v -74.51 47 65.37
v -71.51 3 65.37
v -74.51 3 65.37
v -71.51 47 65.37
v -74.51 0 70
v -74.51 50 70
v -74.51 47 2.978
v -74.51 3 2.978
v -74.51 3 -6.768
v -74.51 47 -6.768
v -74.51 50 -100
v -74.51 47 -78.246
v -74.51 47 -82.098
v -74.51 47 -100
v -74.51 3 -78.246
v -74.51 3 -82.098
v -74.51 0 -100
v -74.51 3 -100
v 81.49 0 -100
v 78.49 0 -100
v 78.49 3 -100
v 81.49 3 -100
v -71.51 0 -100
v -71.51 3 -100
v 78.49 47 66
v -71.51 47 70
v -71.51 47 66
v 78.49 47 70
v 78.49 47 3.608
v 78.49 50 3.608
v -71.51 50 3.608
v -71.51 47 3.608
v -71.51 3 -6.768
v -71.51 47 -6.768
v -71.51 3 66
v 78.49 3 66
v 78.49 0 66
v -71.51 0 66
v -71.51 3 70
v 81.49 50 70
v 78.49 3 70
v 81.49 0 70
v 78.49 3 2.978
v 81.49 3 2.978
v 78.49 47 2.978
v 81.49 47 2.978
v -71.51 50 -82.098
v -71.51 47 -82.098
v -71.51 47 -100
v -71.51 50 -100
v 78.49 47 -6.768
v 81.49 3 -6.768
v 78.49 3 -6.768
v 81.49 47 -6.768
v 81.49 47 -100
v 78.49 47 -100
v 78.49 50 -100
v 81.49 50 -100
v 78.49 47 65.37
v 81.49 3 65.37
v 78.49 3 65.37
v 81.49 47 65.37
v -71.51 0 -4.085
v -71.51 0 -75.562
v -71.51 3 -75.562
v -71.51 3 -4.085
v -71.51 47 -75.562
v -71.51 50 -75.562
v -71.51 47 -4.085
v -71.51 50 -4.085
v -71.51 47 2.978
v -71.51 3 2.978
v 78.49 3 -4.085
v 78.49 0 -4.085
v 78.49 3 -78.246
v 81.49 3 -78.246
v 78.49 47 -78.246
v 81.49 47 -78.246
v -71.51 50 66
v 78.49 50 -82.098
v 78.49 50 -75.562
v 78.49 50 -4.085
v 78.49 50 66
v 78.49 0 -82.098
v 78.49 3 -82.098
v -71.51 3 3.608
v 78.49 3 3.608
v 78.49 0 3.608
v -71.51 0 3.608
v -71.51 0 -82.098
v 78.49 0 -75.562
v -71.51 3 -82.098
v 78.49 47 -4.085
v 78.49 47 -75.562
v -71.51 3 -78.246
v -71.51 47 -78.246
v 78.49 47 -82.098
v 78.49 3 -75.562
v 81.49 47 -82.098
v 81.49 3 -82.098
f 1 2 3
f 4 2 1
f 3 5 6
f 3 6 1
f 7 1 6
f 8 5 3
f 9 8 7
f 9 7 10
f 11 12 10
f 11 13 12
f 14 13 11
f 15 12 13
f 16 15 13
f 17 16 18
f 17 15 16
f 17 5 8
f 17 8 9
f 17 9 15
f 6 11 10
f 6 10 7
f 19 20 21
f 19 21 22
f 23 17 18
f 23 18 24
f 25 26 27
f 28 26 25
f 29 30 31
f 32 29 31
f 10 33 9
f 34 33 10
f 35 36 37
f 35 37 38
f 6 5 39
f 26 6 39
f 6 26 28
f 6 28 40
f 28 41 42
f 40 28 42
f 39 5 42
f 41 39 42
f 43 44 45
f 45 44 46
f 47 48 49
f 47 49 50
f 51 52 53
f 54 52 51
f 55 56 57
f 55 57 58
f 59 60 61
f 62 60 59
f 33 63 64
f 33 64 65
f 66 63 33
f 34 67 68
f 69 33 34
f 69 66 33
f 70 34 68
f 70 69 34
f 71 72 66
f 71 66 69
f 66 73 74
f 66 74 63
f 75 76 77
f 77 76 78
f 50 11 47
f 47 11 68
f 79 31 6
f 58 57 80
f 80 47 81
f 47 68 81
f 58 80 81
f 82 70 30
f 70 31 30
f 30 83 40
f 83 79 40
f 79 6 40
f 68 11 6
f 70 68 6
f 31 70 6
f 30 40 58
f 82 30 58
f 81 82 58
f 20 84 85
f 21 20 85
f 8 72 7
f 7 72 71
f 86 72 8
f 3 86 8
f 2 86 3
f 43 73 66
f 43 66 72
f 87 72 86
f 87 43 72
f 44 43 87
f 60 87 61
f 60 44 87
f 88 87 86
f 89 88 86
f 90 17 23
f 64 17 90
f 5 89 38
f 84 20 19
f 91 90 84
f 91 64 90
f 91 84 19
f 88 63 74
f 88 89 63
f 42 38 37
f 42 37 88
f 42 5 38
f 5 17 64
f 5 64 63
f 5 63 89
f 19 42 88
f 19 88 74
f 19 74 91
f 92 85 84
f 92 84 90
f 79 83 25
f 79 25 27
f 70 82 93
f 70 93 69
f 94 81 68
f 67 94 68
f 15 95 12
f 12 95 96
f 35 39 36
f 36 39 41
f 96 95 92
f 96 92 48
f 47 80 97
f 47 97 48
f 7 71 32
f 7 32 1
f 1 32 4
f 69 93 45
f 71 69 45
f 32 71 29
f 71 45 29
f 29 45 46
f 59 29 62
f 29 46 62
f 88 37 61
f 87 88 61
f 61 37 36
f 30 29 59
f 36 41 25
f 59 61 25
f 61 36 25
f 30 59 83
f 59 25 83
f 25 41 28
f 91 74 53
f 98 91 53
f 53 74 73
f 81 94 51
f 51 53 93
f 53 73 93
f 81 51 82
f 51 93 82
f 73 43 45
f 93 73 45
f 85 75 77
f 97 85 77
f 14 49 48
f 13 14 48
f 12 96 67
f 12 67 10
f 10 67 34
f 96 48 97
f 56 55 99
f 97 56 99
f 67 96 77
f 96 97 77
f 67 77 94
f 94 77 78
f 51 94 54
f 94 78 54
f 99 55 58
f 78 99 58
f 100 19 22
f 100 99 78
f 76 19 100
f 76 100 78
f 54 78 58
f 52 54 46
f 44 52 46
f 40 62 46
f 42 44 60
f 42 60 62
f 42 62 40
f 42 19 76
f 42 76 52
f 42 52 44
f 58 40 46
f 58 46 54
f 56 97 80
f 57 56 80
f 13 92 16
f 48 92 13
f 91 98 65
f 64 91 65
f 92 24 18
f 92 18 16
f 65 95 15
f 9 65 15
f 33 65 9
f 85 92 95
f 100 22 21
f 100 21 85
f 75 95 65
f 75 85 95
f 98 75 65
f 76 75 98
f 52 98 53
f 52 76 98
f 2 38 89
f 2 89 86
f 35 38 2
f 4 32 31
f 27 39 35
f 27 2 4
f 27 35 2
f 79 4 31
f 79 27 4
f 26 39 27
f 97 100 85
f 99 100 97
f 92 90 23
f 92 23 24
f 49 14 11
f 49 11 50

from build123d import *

# Parameters (mm, degrees)
F0_W     = 156
F0_H     = 70
F0_H_2   = 80
F0_H_3   = 20
F1_DEPTH = 50
F2_W     = 150
F2_H     = 17.901978
F2_H_2   = 71.477221
F2_H_3   = 62.391793
F3_DEPTH = 70
F4_W     = 150
F4_H     = 44
F5_DEPTH = 200
F6_W     = 44
F6_H     = 17.90198
F6_H_2   = 71.47722
F6_H_3   = 62.39179
F7_DEPTH = 200


with BuildPart() as f1:
    # F0 (on Front) → F1 (new body)
    with BuildSketch(Plane.XZ):
        with Locations((3.490141, 35)):
            Rectangle(F0_W, F0_H)
        with Locations((3.490141, -40)):
            Rectangle(F0_W, F0_H_2)
        with Locations((3.490141, -90)):
            Rectangle(F0_W, F0_H_3)
    extrude(amount=-F1_DEPTH)

    # F2 (on face) → F3 (cut)
    with BuildSketch(Plane(origin=(0, 50, 0), x_dir=(-1, 0, 0), z_dir=(0, 1, 0))):
        with Locations((-3.490141, -91.049011)):
            Rectangle(F2_W, F2_H)
        with Locations((-3.490141, -39.823143)):
            Rectangle(F2_W, F2_H_2)
        with Locations((-3.490141, 34.804103)):
            Rectangle(F2_W, F2_H_3)
    extrude(amount=-F3_DEPTH, mode=Mode.SUBTRACT)

    # F4 (on face) → F5 (cut)
    with BuildSketch(Plane.XY.offset(70)):
        with Locations((3.490141, 25)):
            Rectangle(F4_W, F4_H)
    extrude(amount=-F5_DEPTH, mode=Mode.SUBTRACT)

    # F6 (on face) → F7 (cut)
    with BuildSketch(Plane.YZ.offset(81.490141)):
        with Locations((25, -91.04901)):
            Rectangle(F6_W, F6_H)
        with Locations((25, -42.506896)):
            Rectangle(F6_W, F6_H_2)
        with Locations((25, 34.174311)):
            Rectangle(F6_W, F6_H_3)
    extrude(amount=-F7_DEPTH, mode=Mode.SUBTRACT)


solid = f1.part
